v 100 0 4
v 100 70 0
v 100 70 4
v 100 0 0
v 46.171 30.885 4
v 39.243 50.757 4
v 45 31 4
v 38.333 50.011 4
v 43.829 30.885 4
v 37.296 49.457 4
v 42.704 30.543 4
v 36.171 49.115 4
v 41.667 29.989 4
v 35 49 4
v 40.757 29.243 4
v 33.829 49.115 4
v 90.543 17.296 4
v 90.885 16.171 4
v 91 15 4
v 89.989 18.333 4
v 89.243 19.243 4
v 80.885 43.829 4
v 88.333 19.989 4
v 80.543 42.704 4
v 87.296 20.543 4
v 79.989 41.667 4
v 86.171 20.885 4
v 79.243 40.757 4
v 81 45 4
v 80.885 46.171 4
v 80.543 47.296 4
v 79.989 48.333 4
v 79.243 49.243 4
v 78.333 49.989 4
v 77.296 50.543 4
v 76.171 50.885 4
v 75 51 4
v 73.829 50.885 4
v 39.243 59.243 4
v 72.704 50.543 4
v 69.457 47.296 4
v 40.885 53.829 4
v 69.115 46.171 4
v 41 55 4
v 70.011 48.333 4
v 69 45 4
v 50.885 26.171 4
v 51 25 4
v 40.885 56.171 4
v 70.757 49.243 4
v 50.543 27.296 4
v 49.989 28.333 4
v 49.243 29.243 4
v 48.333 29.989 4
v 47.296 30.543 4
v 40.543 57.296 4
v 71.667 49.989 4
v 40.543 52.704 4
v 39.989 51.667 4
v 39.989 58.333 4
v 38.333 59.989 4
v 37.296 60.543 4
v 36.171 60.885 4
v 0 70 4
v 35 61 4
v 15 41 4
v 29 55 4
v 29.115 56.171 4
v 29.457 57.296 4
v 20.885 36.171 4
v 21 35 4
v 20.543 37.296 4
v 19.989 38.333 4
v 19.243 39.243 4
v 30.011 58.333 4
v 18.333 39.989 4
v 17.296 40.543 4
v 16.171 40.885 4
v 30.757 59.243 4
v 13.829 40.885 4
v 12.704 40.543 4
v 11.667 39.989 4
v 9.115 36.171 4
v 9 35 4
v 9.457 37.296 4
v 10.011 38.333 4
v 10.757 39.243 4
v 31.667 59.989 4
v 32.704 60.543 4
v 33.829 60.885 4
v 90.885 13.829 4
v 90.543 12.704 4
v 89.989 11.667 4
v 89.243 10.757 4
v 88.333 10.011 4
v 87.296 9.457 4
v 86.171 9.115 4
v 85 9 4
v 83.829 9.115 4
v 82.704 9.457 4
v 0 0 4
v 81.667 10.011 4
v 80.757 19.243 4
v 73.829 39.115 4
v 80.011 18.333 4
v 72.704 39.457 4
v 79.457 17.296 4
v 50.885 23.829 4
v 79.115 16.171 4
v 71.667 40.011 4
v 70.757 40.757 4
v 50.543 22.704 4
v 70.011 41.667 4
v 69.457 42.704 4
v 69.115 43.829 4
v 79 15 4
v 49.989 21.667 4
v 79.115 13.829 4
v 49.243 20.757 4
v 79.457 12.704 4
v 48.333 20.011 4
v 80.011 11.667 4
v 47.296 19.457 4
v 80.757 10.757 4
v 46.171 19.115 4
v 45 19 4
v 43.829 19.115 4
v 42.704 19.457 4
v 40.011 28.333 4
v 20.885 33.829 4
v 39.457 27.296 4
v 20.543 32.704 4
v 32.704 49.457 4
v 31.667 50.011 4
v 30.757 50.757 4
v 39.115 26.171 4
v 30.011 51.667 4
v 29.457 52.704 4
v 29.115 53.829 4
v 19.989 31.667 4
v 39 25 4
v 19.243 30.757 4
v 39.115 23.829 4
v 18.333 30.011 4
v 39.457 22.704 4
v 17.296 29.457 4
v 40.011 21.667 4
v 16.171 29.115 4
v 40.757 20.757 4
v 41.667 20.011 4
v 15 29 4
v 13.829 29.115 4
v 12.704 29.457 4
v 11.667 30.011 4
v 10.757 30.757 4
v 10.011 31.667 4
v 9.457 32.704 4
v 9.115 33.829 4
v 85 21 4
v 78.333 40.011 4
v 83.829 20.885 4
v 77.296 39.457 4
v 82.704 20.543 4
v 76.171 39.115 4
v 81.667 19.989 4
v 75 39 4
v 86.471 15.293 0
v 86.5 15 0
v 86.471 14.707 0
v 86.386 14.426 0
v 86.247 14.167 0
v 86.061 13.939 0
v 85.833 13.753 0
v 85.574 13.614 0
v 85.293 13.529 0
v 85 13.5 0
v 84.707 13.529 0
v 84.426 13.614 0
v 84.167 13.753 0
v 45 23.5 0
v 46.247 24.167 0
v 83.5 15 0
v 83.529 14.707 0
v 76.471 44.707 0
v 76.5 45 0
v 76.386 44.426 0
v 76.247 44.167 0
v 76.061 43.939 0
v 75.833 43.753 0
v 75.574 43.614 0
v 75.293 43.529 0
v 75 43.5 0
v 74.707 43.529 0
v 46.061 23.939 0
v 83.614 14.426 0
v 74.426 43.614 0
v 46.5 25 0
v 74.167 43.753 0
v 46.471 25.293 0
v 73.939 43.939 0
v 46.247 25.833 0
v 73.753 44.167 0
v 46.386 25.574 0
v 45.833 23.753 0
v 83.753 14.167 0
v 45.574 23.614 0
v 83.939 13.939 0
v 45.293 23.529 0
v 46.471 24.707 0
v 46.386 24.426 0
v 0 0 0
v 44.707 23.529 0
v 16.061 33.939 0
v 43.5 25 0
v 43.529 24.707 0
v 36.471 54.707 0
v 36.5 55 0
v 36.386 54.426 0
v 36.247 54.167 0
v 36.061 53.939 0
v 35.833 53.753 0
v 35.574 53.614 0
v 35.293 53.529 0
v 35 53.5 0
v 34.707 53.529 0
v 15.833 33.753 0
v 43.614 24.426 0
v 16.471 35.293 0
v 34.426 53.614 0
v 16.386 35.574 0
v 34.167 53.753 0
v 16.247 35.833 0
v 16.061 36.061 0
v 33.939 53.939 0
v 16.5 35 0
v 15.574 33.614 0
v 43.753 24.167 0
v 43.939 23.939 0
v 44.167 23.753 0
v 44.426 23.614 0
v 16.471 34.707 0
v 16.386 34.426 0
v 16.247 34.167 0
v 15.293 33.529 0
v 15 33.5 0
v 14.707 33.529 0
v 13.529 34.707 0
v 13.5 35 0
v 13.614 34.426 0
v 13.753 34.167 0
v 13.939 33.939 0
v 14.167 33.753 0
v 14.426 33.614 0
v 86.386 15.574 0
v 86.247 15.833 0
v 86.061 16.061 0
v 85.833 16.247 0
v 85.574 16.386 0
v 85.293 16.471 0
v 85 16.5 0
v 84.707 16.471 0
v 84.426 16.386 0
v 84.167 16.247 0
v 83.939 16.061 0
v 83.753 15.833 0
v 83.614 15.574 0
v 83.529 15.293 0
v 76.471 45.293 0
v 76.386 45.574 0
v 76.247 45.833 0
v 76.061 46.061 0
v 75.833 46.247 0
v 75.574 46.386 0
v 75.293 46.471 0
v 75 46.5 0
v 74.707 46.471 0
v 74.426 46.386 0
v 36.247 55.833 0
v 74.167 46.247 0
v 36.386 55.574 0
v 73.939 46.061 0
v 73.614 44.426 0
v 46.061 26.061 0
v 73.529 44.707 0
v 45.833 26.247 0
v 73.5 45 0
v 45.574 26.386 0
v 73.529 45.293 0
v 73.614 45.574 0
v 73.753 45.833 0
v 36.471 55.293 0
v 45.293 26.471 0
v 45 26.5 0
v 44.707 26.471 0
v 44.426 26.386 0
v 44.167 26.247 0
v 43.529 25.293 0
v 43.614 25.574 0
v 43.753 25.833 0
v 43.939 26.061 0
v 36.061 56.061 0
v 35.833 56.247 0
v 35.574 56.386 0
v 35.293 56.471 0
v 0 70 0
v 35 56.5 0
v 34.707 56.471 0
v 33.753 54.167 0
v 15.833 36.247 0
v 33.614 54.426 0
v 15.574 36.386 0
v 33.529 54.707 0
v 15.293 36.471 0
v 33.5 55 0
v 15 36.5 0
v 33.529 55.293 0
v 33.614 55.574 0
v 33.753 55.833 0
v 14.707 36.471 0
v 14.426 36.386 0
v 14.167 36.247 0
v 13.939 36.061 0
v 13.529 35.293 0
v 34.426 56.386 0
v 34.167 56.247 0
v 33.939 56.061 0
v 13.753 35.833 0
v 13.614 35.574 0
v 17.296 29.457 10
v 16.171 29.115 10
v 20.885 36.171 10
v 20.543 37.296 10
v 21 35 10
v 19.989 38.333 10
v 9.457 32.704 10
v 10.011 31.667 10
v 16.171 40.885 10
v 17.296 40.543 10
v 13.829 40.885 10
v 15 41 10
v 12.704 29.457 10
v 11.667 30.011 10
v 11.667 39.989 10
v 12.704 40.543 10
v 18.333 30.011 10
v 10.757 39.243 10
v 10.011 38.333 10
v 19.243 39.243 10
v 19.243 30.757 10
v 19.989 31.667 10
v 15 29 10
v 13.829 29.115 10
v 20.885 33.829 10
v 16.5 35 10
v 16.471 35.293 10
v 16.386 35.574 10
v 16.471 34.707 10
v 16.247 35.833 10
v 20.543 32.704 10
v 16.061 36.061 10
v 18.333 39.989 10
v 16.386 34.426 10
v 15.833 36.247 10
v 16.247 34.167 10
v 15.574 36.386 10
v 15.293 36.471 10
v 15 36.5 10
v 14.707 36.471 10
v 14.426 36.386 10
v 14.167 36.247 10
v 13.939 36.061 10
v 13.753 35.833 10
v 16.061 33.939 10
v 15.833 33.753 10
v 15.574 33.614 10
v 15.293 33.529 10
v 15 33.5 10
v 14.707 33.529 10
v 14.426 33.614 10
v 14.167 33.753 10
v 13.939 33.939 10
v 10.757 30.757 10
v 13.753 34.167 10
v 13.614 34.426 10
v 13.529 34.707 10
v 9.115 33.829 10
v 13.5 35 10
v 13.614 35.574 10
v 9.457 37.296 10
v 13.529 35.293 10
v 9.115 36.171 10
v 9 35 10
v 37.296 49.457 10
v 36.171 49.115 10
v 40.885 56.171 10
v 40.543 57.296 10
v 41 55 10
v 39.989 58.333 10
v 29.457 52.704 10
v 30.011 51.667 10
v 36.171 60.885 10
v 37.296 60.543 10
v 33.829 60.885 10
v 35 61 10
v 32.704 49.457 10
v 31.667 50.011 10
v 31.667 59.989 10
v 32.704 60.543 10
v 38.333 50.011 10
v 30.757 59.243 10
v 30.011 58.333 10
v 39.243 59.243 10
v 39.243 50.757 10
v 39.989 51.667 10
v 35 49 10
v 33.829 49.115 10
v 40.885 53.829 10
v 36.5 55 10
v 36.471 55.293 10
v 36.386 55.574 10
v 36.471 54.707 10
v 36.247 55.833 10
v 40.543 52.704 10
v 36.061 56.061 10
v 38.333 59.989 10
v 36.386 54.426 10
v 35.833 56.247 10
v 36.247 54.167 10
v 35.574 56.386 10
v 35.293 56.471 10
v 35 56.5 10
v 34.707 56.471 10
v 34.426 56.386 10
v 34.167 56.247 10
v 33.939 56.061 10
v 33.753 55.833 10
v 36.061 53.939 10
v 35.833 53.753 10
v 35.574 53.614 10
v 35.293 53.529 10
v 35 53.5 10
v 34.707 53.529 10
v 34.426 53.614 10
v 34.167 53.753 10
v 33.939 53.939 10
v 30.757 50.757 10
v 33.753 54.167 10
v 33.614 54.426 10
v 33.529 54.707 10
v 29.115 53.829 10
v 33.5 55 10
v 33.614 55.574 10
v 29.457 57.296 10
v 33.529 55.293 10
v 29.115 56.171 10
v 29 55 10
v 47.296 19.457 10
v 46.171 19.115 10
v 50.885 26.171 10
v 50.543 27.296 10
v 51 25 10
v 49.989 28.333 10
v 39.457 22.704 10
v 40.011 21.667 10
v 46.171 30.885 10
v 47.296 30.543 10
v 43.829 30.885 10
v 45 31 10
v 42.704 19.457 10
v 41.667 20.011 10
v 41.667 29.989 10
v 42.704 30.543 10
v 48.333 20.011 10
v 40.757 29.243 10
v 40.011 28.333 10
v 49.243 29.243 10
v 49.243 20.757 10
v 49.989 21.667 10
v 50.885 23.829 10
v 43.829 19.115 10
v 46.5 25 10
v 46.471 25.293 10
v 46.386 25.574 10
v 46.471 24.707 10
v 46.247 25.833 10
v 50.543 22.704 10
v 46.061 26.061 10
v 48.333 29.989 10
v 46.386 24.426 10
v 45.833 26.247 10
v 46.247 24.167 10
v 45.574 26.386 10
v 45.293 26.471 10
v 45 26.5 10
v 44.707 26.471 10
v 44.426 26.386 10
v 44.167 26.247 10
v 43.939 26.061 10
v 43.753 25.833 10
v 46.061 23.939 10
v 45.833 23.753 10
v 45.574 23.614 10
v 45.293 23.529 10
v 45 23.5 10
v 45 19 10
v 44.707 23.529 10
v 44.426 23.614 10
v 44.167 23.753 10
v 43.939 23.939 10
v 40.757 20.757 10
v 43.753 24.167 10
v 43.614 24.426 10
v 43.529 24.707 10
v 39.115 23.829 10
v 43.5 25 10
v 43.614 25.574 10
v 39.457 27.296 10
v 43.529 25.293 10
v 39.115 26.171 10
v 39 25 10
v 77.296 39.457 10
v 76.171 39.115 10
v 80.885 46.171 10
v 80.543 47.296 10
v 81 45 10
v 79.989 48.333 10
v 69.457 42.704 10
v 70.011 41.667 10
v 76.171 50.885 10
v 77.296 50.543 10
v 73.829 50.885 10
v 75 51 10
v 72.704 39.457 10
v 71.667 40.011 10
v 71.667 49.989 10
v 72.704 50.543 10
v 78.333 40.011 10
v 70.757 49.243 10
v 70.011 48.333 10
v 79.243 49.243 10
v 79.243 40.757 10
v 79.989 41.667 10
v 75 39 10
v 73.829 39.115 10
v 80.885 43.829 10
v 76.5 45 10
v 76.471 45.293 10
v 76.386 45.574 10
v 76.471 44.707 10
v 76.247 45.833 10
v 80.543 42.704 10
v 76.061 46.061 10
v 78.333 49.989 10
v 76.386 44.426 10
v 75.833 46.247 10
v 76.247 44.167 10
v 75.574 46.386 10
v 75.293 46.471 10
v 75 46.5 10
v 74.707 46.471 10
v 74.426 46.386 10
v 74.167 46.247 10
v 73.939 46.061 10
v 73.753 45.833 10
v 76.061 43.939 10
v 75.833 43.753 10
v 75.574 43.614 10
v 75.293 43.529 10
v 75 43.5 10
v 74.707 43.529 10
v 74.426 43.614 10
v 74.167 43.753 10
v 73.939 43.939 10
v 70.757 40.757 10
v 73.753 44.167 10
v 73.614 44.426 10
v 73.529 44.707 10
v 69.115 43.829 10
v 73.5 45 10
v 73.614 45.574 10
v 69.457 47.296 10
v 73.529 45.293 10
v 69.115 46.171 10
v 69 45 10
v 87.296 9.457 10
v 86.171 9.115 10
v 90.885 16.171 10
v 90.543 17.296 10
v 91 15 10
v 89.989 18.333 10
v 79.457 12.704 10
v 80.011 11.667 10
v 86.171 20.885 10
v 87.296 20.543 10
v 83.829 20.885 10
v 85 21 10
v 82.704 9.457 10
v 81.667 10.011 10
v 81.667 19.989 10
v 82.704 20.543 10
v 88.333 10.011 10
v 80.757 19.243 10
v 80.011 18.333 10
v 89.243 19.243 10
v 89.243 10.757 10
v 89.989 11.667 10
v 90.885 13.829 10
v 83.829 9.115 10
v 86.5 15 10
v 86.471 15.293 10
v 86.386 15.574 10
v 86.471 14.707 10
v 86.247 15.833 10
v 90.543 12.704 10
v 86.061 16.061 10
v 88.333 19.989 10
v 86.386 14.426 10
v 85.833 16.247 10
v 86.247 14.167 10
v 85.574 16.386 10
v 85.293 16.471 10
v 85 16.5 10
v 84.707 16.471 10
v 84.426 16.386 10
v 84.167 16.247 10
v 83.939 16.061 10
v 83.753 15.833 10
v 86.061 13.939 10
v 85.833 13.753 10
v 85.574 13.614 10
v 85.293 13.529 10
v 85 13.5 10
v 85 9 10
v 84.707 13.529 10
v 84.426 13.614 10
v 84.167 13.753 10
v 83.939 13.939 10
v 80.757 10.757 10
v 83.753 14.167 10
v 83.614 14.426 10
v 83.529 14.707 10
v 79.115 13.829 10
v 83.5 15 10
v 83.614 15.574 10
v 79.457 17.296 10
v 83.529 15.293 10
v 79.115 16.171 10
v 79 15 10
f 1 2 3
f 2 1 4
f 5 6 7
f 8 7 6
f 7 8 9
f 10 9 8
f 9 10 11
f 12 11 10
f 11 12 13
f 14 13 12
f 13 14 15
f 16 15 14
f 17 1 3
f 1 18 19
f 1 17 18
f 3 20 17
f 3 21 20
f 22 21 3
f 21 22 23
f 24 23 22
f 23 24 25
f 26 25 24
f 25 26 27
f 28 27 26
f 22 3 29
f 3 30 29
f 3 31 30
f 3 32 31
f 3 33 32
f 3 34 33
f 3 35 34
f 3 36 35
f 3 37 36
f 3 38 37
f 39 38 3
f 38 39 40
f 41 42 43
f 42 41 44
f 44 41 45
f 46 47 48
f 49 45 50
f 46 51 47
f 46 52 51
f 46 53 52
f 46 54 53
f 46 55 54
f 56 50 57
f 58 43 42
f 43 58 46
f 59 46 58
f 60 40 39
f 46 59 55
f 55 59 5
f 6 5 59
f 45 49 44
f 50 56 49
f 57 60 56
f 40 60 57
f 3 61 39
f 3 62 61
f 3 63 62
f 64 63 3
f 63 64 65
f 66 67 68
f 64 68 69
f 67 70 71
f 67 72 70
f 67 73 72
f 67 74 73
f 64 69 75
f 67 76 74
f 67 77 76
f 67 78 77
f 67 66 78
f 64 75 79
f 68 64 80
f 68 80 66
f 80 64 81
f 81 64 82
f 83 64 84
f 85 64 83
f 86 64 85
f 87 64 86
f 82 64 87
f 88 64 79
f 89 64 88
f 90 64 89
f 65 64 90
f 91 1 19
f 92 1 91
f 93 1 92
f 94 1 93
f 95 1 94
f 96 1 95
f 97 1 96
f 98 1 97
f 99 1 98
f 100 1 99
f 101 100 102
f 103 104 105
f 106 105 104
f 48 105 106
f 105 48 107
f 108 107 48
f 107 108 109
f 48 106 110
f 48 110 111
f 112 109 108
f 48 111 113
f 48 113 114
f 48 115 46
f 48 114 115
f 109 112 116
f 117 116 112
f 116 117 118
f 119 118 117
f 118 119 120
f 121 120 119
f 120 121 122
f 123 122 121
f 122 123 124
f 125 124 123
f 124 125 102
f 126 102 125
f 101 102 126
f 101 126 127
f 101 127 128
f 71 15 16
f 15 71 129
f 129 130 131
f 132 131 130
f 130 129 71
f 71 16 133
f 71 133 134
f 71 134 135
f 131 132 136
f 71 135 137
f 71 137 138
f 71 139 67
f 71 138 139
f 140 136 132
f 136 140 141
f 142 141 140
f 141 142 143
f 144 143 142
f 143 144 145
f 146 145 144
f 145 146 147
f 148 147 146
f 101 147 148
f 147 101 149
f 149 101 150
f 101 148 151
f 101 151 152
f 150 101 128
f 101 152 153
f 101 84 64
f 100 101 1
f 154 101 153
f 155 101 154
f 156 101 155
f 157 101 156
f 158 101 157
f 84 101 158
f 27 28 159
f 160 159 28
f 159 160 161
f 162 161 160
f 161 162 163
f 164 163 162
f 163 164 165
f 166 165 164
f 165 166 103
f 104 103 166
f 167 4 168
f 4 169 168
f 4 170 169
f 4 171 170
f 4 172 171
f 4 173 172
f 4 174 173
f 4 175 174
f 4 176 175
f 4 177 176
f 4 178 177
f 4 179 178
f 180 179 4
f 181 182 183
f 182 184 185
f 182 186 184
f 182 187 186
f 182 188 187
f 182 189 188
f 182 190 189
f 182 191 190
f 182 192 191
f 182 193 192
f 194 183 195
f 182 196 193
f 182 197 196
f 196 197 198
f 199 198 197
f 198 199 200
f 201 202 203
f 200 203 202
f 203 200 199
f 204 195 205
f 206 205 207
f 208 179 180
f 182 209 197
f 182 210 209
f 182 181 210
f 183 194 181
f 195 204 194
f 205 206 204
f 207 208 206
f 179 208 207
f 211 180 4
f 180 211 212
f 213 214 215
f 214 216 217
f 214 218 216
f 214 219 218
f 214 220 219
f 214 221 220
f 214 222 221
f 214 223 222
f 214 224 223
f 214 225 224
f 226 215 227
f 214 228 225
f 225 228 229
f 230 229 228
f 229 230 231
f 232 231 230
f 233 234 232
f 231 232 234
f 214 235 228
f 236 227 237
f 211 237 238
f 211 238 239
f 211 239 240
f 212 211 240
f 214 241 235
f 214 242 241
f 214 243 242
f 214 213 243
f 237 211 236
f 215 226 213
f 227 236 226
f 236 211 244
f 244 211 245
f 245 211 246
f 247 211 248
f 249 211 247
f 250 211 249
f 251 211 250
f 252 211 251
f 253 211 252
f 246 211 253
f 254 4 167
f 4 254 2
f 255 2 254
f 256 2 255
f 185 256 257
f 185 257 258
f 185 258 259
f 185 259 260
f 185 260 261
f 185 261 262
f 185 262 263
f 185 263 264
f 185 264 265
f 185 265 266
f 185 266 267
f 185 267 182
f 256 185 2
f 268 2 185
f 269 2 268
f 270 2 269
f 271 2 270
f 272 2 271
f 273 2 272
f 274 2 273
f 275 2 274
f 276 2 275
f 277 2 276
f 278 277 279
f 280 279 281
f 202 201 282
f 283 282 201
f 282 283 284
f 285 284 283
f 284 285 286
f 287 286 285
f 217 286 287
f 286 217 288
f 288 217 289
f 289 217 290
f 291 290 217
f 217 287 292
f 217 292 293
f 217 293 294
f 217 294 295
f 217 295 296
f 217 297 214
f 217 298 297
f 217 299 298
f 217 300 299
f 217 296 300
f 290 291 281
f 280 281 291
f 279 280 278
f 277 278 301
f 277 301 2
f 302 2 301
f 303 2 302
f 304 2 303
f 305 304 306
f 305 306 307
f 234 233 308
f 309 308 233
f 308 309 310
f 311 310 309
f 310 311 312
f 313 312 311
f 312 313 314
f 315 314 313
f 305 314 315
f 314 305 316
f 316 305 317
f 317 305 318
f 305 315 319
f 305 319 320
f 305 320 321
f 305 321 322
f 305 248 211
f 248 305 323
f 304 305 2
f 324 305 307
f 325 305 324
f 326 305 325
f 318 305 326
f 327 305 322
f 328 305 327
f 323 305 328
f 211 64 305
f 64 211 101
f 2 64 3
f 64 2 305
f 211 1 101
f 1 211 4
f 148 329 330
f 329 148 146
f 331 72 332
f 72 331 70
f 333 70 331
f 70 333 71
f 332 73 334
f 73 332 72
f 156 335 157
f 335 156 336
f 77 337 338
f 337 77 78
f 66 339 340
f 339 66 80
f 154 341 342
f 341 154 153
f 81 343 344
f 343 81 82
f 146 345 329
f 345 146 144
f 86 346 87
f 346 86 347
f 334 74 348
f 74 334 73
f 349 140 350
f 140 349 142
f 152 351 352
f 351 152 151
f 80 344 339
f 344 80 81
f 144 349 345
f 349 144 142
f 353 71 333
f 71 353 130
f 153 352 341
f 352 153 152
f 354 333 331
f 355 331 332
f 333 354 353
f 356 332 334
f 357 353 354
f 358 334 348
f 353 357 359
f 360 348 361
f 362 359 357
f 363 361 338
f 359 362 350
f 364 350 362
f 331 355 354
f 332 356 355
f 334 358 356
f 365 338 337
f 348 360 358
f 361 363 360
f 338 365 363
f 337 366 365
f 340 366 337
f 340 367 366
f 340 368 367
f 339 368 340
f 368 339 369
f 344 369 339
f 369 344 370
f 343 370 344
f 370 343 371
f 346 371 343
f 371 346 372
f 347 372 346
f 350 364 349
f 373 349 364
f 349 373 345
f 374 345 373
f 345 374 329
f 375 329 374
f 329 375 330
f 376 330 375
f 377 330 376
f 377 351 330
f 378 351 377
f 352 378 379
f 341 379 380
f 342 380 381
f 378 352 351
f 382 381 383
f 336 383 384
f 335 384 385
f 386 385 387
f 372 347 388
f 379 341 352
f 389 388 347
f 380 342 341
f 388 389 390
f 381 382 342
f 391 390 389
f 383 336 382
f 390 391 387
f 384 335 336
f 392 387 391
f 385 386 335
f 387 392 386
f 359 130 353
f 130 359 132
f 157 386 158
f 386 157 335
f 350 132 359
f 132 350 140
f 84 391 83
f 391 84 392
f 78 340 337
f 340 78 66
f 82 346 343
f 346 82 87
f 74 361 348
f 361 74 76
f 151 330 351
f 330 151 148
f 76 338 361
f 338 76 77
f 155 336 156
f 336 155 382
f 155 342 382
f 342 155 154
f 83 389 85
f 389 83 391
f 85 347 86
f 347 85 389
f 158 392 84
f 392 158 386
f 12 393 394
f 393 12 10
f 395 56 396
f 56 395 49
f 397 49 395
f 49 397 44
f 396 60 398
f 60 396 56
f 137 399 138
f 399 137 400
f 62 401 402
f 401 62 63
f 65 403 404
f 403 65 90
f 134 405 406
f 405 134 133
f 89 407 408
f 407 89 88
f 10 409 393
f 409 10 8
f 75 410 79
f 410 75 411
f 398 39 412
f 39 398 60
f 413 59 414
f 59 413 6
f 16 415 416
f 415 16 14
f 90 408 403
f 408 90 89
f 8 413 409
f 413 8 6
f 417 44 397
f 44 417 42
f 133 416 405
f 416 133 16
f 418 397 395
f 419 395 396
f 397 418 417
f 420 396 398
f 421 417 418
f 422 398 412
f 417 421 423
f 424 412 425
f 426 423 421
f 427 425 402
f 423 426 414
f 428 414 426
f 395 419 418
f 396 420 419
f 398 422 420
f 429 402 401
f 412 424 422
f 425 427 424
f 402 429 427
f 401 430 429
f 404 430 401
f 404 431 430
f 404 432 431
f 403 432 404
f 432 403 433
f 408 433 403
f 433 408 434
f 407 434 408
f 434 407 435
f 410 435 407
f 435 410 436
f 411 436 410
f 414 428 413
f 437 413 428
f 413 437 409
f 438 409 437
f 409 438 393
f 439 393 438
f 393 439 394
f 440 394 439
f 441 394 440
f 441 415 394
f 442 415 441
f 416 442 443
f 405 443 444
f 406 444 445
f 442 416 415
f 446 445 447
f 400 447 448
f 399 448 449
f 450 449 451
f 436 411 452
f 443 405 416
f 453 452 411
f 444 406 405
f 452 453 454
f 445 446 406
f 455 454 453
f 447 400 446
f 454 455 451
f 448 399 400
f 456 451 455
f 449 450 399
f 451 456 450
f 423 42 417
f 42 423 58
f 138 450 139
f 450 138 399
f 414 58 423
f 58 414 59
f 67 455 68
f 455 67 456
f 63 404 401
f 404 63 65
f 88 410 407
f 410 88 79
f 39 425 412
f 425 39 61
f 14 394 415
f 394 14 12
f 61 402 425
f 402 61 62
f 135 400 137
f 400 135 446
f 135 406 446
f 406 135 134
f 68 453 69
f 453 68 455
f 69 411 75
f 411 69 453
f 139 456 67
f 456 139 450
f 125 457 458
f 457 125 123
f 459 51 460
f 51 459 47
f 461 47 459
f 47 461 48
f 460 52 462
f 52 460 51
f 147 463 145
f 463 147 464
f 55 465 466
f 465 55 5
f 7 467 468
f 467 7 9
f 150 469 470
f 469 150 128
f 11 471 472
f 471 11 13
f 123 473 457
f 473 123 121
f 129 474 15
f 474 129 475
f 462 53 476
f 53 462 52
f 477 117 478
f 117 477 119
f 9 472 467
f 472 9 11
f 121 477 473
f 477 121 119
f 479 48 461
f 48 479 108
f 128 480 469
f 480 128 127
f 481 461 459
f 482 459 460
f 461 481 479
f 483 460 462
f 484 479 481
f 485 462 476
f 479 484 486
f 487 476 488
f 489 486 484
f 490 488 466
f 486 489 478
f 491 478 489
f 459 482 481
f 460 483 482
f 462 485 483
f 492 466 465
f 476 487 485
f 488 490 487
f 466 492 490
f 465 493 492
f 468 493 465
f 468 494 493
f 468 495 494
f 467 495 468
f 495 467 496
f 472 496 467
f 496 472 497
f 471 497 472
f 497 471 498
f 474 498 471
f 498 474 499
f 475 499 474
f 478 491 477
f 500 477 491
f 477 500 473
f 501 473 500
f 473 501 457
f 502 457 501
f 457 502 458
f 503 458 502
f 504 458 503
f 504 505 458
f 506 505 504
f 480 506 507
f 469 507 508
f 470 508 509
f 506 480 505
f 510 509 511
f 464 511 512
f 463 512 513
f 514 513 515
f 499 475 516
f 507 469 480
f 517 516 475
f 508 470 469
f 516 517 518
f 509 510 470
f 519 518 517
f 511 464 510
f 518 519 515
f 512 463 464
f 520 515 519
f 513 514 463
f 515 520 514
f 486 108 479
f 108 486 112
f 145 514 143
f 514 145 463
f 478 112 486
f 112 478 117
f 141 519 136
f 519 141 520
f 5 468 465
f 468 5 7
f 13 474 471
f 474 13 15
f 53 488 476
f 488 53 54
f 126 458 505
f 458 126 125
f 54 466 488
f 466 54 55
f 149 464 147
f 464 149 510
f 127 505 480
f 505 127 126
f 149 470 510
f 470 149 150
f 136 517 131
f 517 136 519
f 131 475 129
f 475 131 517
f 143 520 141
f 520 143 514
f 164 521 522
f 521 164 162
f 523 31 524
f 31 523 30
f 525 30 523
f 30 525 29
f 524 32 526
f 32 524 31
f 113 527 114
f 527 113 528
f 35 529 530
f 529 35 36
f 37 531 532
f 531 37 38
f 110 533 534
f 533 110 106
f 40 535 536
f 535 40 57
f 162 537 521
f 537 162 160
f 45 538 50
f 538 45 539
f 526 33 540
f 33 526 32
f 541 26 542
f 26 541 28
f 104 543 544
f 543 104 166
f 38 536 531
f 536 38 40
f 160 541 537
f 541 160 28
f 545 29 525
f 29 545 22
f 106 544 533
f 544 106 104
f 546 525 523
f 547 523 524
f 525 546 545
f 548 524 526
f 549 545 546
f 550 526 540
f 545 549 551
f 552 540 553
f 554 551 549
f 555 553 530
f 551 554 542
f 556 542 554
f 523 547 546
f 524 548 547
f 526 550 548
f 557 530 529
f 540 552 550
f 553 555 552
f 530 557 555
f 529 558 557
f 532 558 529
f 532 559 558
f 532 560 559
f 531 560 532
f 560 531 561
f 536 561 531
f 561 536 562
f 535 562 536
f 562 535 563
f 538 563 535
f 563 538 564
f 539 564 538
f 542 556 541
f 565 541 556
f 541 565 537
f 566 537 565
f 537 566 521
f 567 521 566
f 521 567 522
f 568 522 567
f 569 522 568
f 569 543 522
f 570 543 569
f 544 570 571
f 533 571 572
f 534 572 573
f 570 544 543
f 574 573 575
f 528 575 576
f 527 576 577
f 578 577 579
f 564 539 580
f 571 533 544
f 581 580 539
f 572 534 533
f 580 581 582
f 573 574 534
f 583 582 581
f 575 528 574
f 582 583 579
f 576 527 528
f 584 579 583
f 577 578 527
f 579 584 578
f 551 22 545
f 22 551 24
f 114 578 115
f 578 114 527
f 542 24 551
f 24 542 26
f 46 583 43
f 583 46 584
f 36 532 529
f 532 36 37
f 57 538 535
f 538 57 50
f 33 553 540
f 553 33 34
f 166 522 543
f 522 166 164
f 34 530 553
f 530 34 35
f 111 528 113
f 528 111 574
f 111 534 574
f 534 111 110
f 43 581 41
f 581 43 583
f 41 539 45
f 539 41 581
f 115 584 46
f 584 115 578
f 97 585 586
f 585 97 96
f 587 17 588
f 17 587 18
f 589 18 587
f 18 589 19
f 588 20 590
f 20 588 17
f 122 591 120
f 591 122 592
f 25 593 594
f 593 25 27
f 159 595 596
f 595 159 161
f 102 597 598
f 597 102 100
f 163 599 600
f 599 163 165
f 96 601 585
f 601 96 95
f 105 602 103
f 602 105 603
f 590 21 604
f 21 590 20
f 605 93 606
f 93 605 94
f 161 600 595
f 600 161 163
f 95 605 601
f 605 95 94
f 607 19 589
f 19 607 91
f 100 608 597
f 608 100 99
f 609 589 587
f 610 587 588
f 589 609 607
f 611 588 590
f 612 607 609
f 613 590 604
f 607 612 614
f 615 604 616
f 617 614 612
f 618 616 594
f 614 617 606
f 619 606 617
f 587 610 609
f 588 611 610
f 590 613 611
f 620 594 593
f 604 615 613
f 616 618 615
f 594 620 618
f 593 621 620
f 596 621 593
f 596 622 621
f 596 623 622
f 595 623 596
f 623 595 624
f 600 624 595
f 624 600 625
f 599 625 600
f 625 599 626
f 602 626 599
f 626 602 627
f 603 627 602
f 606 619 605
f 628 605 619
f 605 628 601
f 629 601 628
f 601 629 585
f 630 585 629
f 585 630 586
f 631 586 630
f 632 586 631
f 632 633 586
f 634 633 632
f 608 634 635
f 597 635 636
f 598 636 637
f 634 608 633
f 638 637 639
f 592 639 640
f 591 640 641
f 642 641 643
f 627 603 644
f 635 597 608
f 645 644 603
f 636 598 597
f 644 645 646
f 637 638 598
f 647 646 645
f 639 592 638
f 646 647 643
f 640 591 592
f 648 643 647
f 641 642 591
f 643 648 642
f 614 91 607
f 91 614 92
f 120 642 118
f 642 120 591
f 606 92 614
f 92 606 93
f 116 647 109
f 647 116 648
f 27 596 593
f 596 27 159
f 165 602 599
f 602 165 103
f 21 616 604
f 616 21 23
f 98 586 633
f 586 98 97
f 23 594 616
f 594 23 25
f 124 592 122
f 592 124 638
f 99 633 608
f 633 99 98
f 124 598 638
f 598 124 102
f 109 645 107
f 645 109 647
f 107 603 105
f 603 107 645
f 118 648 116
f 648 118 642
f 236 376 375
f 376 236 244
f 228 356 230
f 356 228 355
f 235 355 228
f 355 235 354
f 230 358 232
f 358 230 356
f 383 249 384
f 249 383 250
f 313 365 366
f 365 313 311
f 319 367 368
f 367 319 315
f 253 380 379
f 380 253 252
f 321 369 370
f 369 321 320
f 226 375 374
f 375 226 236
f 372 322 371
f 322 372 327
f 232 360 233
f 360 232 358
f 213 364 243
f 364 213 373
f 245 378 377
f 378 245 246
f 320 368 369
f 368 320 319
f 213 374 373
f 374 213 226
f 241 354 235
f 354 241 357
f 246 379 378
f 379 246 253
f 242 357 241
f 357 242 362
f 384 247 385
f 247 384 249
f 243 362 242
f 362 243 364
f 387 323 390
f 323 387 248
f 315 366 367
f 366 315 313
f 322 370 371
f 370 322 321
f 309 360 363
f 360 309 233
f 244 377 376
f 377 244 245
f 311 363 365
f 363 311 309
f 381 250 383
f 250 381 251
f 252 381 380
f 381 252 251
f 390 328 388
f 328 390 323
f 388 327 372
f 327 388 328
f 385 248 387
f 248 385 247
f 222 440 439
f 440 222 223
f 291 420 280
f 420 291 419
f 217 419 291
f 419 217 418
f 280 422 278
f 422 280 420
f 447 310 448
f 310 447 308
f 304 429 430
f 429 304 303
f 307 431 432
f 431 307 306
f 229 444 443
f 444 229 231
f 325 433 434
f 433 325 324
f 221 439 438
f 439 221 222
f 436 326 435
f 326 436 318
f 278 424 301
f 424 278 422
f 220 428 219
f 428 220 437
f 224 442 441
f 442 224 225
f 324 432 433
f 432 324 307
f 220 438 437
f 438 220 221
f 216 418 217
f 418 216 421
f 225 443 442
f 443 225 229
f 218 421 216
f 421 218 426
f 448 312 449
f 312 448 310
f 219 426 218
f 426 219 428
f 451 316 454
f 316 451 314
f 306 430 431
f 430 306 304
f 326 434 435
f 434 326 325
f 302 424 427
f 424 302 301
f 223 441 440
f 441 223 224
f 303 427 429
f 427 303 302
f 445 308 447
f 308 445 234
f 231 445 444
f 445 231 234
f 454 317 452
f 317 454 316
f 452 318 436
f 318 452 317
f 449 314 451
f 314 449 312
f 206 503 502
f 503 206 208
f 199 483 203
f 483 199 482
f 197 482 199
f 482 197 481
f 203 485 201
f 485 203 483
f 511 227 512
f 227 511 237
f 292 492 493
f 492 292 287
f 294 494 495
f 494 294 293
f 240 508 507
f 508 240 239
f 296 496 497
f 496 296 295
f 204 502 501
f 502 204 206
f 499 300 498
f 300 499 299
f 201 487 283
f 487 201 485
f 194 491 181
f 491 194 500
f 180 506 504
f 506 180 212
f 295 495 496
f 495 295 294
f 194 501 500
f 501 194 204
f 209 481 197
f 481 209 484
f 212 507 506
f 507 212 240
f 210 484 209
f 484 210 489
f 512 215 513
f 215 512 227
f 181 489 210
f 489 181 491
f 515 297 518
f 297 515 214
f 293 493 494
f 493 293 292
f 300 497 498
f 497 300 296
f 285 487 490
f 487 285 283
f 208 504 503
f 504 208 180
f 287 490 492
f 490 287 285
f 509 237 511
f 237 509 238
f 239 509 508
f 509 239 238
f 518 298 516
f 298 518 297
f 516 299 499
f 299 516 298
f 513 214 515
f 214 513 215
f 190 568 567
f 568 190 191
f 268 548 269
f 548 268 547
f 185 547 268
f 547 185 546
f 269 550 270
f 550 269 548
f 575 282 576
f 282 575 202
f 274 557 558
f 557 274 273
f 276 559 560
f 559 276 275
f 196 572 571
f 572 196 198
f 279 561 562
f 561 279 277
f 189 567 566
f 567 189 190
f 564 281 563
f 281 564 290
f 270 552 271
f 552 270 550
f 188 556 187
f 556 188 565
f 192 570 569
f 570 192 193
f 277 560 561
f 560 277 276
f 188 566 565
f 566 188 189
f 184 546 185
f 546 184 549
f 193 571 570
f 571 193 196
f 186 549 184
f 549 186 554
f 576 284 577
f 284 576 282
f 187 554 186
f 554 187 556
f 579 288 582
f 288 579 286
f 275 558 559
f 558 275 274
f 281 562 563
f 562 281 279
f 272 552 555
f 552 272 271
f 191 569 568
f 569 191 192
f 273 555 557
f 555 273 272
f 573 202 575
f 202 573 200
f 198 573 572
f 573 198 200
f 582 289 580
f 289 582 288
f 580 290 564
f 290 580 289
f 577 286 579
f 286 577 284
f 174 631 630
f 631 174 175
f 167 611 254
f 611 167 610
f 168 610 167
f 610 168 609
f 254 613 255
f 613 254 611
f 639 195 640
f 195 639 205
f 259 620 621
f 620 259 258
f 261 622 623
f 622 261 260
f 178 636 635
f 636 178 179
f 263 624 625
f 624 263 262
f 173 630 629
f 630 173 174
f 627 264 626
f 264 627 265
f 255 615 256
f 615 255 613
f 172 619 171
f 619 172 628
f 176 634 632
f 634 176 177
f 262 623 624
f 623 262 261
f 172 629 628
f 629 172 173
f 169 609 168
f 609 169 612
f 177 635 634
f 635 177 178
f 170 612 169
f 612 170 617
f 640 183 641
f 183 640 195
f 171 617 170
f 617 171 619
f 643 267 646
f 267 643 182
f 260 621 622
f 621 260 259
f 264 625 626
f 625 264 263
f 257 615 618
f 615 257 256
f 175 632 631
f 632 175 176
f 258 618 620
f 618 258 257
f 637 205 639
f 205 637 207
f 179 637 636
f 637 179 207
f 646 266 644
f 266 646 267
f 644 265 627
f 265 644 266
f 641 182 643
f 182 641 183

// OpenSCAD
$fn = 32;

// ----------------------------------------------------------------------
// Boss field: plate with bosses at given coordinates
// ----------------------------------------------------------------------

// --- parameters (mm) ---
plate_l = 100;            // plate length, X
plate_w = 70;             // plate width, Y
plate_t = 4;              // plate thickness, Z
boss_d = 12;              // boss diameter
boss_h = 6;               // boss height above the plate
bore_d = 3;               // boss bore

total_h = plate_t + boss_h;  // overall height

difference() {
  union() {
    cube([plate_l, plate_w, plate_t]);
    translate([15, 35, plate_t]) cylinder(h = boss_h, d = boss_d);
    translate([35, 55, plate_t]) cylinder(h = boss_h, d = boss_d);
    translate([45, 25, plate_t]) cylinder(h = boss_h, d = boss_d);
    translate([75, 45, plate_t]) cylinder(h = boss_h, d = boss_d);
    translate([85, 15, plate_t]) cylinder(h = boss_h, d = boss_d);
  }
  translate([15, 35, -1]) cylinder(h = total_h + 2, d = bore_d);
  translate([35, 55, -1]) cylinder(h = total_h + 2, d = bore_d);
  translate([45, 25, -1]) cylinder(h = total_h + 2, d = bore_d);
  translate([75, 45, -1]) cylinder(h = total_h + 2, d = bore_d);
  translate([85, 15, -1]) cylinder(h = total_h + 2, d = bore_d);
}
